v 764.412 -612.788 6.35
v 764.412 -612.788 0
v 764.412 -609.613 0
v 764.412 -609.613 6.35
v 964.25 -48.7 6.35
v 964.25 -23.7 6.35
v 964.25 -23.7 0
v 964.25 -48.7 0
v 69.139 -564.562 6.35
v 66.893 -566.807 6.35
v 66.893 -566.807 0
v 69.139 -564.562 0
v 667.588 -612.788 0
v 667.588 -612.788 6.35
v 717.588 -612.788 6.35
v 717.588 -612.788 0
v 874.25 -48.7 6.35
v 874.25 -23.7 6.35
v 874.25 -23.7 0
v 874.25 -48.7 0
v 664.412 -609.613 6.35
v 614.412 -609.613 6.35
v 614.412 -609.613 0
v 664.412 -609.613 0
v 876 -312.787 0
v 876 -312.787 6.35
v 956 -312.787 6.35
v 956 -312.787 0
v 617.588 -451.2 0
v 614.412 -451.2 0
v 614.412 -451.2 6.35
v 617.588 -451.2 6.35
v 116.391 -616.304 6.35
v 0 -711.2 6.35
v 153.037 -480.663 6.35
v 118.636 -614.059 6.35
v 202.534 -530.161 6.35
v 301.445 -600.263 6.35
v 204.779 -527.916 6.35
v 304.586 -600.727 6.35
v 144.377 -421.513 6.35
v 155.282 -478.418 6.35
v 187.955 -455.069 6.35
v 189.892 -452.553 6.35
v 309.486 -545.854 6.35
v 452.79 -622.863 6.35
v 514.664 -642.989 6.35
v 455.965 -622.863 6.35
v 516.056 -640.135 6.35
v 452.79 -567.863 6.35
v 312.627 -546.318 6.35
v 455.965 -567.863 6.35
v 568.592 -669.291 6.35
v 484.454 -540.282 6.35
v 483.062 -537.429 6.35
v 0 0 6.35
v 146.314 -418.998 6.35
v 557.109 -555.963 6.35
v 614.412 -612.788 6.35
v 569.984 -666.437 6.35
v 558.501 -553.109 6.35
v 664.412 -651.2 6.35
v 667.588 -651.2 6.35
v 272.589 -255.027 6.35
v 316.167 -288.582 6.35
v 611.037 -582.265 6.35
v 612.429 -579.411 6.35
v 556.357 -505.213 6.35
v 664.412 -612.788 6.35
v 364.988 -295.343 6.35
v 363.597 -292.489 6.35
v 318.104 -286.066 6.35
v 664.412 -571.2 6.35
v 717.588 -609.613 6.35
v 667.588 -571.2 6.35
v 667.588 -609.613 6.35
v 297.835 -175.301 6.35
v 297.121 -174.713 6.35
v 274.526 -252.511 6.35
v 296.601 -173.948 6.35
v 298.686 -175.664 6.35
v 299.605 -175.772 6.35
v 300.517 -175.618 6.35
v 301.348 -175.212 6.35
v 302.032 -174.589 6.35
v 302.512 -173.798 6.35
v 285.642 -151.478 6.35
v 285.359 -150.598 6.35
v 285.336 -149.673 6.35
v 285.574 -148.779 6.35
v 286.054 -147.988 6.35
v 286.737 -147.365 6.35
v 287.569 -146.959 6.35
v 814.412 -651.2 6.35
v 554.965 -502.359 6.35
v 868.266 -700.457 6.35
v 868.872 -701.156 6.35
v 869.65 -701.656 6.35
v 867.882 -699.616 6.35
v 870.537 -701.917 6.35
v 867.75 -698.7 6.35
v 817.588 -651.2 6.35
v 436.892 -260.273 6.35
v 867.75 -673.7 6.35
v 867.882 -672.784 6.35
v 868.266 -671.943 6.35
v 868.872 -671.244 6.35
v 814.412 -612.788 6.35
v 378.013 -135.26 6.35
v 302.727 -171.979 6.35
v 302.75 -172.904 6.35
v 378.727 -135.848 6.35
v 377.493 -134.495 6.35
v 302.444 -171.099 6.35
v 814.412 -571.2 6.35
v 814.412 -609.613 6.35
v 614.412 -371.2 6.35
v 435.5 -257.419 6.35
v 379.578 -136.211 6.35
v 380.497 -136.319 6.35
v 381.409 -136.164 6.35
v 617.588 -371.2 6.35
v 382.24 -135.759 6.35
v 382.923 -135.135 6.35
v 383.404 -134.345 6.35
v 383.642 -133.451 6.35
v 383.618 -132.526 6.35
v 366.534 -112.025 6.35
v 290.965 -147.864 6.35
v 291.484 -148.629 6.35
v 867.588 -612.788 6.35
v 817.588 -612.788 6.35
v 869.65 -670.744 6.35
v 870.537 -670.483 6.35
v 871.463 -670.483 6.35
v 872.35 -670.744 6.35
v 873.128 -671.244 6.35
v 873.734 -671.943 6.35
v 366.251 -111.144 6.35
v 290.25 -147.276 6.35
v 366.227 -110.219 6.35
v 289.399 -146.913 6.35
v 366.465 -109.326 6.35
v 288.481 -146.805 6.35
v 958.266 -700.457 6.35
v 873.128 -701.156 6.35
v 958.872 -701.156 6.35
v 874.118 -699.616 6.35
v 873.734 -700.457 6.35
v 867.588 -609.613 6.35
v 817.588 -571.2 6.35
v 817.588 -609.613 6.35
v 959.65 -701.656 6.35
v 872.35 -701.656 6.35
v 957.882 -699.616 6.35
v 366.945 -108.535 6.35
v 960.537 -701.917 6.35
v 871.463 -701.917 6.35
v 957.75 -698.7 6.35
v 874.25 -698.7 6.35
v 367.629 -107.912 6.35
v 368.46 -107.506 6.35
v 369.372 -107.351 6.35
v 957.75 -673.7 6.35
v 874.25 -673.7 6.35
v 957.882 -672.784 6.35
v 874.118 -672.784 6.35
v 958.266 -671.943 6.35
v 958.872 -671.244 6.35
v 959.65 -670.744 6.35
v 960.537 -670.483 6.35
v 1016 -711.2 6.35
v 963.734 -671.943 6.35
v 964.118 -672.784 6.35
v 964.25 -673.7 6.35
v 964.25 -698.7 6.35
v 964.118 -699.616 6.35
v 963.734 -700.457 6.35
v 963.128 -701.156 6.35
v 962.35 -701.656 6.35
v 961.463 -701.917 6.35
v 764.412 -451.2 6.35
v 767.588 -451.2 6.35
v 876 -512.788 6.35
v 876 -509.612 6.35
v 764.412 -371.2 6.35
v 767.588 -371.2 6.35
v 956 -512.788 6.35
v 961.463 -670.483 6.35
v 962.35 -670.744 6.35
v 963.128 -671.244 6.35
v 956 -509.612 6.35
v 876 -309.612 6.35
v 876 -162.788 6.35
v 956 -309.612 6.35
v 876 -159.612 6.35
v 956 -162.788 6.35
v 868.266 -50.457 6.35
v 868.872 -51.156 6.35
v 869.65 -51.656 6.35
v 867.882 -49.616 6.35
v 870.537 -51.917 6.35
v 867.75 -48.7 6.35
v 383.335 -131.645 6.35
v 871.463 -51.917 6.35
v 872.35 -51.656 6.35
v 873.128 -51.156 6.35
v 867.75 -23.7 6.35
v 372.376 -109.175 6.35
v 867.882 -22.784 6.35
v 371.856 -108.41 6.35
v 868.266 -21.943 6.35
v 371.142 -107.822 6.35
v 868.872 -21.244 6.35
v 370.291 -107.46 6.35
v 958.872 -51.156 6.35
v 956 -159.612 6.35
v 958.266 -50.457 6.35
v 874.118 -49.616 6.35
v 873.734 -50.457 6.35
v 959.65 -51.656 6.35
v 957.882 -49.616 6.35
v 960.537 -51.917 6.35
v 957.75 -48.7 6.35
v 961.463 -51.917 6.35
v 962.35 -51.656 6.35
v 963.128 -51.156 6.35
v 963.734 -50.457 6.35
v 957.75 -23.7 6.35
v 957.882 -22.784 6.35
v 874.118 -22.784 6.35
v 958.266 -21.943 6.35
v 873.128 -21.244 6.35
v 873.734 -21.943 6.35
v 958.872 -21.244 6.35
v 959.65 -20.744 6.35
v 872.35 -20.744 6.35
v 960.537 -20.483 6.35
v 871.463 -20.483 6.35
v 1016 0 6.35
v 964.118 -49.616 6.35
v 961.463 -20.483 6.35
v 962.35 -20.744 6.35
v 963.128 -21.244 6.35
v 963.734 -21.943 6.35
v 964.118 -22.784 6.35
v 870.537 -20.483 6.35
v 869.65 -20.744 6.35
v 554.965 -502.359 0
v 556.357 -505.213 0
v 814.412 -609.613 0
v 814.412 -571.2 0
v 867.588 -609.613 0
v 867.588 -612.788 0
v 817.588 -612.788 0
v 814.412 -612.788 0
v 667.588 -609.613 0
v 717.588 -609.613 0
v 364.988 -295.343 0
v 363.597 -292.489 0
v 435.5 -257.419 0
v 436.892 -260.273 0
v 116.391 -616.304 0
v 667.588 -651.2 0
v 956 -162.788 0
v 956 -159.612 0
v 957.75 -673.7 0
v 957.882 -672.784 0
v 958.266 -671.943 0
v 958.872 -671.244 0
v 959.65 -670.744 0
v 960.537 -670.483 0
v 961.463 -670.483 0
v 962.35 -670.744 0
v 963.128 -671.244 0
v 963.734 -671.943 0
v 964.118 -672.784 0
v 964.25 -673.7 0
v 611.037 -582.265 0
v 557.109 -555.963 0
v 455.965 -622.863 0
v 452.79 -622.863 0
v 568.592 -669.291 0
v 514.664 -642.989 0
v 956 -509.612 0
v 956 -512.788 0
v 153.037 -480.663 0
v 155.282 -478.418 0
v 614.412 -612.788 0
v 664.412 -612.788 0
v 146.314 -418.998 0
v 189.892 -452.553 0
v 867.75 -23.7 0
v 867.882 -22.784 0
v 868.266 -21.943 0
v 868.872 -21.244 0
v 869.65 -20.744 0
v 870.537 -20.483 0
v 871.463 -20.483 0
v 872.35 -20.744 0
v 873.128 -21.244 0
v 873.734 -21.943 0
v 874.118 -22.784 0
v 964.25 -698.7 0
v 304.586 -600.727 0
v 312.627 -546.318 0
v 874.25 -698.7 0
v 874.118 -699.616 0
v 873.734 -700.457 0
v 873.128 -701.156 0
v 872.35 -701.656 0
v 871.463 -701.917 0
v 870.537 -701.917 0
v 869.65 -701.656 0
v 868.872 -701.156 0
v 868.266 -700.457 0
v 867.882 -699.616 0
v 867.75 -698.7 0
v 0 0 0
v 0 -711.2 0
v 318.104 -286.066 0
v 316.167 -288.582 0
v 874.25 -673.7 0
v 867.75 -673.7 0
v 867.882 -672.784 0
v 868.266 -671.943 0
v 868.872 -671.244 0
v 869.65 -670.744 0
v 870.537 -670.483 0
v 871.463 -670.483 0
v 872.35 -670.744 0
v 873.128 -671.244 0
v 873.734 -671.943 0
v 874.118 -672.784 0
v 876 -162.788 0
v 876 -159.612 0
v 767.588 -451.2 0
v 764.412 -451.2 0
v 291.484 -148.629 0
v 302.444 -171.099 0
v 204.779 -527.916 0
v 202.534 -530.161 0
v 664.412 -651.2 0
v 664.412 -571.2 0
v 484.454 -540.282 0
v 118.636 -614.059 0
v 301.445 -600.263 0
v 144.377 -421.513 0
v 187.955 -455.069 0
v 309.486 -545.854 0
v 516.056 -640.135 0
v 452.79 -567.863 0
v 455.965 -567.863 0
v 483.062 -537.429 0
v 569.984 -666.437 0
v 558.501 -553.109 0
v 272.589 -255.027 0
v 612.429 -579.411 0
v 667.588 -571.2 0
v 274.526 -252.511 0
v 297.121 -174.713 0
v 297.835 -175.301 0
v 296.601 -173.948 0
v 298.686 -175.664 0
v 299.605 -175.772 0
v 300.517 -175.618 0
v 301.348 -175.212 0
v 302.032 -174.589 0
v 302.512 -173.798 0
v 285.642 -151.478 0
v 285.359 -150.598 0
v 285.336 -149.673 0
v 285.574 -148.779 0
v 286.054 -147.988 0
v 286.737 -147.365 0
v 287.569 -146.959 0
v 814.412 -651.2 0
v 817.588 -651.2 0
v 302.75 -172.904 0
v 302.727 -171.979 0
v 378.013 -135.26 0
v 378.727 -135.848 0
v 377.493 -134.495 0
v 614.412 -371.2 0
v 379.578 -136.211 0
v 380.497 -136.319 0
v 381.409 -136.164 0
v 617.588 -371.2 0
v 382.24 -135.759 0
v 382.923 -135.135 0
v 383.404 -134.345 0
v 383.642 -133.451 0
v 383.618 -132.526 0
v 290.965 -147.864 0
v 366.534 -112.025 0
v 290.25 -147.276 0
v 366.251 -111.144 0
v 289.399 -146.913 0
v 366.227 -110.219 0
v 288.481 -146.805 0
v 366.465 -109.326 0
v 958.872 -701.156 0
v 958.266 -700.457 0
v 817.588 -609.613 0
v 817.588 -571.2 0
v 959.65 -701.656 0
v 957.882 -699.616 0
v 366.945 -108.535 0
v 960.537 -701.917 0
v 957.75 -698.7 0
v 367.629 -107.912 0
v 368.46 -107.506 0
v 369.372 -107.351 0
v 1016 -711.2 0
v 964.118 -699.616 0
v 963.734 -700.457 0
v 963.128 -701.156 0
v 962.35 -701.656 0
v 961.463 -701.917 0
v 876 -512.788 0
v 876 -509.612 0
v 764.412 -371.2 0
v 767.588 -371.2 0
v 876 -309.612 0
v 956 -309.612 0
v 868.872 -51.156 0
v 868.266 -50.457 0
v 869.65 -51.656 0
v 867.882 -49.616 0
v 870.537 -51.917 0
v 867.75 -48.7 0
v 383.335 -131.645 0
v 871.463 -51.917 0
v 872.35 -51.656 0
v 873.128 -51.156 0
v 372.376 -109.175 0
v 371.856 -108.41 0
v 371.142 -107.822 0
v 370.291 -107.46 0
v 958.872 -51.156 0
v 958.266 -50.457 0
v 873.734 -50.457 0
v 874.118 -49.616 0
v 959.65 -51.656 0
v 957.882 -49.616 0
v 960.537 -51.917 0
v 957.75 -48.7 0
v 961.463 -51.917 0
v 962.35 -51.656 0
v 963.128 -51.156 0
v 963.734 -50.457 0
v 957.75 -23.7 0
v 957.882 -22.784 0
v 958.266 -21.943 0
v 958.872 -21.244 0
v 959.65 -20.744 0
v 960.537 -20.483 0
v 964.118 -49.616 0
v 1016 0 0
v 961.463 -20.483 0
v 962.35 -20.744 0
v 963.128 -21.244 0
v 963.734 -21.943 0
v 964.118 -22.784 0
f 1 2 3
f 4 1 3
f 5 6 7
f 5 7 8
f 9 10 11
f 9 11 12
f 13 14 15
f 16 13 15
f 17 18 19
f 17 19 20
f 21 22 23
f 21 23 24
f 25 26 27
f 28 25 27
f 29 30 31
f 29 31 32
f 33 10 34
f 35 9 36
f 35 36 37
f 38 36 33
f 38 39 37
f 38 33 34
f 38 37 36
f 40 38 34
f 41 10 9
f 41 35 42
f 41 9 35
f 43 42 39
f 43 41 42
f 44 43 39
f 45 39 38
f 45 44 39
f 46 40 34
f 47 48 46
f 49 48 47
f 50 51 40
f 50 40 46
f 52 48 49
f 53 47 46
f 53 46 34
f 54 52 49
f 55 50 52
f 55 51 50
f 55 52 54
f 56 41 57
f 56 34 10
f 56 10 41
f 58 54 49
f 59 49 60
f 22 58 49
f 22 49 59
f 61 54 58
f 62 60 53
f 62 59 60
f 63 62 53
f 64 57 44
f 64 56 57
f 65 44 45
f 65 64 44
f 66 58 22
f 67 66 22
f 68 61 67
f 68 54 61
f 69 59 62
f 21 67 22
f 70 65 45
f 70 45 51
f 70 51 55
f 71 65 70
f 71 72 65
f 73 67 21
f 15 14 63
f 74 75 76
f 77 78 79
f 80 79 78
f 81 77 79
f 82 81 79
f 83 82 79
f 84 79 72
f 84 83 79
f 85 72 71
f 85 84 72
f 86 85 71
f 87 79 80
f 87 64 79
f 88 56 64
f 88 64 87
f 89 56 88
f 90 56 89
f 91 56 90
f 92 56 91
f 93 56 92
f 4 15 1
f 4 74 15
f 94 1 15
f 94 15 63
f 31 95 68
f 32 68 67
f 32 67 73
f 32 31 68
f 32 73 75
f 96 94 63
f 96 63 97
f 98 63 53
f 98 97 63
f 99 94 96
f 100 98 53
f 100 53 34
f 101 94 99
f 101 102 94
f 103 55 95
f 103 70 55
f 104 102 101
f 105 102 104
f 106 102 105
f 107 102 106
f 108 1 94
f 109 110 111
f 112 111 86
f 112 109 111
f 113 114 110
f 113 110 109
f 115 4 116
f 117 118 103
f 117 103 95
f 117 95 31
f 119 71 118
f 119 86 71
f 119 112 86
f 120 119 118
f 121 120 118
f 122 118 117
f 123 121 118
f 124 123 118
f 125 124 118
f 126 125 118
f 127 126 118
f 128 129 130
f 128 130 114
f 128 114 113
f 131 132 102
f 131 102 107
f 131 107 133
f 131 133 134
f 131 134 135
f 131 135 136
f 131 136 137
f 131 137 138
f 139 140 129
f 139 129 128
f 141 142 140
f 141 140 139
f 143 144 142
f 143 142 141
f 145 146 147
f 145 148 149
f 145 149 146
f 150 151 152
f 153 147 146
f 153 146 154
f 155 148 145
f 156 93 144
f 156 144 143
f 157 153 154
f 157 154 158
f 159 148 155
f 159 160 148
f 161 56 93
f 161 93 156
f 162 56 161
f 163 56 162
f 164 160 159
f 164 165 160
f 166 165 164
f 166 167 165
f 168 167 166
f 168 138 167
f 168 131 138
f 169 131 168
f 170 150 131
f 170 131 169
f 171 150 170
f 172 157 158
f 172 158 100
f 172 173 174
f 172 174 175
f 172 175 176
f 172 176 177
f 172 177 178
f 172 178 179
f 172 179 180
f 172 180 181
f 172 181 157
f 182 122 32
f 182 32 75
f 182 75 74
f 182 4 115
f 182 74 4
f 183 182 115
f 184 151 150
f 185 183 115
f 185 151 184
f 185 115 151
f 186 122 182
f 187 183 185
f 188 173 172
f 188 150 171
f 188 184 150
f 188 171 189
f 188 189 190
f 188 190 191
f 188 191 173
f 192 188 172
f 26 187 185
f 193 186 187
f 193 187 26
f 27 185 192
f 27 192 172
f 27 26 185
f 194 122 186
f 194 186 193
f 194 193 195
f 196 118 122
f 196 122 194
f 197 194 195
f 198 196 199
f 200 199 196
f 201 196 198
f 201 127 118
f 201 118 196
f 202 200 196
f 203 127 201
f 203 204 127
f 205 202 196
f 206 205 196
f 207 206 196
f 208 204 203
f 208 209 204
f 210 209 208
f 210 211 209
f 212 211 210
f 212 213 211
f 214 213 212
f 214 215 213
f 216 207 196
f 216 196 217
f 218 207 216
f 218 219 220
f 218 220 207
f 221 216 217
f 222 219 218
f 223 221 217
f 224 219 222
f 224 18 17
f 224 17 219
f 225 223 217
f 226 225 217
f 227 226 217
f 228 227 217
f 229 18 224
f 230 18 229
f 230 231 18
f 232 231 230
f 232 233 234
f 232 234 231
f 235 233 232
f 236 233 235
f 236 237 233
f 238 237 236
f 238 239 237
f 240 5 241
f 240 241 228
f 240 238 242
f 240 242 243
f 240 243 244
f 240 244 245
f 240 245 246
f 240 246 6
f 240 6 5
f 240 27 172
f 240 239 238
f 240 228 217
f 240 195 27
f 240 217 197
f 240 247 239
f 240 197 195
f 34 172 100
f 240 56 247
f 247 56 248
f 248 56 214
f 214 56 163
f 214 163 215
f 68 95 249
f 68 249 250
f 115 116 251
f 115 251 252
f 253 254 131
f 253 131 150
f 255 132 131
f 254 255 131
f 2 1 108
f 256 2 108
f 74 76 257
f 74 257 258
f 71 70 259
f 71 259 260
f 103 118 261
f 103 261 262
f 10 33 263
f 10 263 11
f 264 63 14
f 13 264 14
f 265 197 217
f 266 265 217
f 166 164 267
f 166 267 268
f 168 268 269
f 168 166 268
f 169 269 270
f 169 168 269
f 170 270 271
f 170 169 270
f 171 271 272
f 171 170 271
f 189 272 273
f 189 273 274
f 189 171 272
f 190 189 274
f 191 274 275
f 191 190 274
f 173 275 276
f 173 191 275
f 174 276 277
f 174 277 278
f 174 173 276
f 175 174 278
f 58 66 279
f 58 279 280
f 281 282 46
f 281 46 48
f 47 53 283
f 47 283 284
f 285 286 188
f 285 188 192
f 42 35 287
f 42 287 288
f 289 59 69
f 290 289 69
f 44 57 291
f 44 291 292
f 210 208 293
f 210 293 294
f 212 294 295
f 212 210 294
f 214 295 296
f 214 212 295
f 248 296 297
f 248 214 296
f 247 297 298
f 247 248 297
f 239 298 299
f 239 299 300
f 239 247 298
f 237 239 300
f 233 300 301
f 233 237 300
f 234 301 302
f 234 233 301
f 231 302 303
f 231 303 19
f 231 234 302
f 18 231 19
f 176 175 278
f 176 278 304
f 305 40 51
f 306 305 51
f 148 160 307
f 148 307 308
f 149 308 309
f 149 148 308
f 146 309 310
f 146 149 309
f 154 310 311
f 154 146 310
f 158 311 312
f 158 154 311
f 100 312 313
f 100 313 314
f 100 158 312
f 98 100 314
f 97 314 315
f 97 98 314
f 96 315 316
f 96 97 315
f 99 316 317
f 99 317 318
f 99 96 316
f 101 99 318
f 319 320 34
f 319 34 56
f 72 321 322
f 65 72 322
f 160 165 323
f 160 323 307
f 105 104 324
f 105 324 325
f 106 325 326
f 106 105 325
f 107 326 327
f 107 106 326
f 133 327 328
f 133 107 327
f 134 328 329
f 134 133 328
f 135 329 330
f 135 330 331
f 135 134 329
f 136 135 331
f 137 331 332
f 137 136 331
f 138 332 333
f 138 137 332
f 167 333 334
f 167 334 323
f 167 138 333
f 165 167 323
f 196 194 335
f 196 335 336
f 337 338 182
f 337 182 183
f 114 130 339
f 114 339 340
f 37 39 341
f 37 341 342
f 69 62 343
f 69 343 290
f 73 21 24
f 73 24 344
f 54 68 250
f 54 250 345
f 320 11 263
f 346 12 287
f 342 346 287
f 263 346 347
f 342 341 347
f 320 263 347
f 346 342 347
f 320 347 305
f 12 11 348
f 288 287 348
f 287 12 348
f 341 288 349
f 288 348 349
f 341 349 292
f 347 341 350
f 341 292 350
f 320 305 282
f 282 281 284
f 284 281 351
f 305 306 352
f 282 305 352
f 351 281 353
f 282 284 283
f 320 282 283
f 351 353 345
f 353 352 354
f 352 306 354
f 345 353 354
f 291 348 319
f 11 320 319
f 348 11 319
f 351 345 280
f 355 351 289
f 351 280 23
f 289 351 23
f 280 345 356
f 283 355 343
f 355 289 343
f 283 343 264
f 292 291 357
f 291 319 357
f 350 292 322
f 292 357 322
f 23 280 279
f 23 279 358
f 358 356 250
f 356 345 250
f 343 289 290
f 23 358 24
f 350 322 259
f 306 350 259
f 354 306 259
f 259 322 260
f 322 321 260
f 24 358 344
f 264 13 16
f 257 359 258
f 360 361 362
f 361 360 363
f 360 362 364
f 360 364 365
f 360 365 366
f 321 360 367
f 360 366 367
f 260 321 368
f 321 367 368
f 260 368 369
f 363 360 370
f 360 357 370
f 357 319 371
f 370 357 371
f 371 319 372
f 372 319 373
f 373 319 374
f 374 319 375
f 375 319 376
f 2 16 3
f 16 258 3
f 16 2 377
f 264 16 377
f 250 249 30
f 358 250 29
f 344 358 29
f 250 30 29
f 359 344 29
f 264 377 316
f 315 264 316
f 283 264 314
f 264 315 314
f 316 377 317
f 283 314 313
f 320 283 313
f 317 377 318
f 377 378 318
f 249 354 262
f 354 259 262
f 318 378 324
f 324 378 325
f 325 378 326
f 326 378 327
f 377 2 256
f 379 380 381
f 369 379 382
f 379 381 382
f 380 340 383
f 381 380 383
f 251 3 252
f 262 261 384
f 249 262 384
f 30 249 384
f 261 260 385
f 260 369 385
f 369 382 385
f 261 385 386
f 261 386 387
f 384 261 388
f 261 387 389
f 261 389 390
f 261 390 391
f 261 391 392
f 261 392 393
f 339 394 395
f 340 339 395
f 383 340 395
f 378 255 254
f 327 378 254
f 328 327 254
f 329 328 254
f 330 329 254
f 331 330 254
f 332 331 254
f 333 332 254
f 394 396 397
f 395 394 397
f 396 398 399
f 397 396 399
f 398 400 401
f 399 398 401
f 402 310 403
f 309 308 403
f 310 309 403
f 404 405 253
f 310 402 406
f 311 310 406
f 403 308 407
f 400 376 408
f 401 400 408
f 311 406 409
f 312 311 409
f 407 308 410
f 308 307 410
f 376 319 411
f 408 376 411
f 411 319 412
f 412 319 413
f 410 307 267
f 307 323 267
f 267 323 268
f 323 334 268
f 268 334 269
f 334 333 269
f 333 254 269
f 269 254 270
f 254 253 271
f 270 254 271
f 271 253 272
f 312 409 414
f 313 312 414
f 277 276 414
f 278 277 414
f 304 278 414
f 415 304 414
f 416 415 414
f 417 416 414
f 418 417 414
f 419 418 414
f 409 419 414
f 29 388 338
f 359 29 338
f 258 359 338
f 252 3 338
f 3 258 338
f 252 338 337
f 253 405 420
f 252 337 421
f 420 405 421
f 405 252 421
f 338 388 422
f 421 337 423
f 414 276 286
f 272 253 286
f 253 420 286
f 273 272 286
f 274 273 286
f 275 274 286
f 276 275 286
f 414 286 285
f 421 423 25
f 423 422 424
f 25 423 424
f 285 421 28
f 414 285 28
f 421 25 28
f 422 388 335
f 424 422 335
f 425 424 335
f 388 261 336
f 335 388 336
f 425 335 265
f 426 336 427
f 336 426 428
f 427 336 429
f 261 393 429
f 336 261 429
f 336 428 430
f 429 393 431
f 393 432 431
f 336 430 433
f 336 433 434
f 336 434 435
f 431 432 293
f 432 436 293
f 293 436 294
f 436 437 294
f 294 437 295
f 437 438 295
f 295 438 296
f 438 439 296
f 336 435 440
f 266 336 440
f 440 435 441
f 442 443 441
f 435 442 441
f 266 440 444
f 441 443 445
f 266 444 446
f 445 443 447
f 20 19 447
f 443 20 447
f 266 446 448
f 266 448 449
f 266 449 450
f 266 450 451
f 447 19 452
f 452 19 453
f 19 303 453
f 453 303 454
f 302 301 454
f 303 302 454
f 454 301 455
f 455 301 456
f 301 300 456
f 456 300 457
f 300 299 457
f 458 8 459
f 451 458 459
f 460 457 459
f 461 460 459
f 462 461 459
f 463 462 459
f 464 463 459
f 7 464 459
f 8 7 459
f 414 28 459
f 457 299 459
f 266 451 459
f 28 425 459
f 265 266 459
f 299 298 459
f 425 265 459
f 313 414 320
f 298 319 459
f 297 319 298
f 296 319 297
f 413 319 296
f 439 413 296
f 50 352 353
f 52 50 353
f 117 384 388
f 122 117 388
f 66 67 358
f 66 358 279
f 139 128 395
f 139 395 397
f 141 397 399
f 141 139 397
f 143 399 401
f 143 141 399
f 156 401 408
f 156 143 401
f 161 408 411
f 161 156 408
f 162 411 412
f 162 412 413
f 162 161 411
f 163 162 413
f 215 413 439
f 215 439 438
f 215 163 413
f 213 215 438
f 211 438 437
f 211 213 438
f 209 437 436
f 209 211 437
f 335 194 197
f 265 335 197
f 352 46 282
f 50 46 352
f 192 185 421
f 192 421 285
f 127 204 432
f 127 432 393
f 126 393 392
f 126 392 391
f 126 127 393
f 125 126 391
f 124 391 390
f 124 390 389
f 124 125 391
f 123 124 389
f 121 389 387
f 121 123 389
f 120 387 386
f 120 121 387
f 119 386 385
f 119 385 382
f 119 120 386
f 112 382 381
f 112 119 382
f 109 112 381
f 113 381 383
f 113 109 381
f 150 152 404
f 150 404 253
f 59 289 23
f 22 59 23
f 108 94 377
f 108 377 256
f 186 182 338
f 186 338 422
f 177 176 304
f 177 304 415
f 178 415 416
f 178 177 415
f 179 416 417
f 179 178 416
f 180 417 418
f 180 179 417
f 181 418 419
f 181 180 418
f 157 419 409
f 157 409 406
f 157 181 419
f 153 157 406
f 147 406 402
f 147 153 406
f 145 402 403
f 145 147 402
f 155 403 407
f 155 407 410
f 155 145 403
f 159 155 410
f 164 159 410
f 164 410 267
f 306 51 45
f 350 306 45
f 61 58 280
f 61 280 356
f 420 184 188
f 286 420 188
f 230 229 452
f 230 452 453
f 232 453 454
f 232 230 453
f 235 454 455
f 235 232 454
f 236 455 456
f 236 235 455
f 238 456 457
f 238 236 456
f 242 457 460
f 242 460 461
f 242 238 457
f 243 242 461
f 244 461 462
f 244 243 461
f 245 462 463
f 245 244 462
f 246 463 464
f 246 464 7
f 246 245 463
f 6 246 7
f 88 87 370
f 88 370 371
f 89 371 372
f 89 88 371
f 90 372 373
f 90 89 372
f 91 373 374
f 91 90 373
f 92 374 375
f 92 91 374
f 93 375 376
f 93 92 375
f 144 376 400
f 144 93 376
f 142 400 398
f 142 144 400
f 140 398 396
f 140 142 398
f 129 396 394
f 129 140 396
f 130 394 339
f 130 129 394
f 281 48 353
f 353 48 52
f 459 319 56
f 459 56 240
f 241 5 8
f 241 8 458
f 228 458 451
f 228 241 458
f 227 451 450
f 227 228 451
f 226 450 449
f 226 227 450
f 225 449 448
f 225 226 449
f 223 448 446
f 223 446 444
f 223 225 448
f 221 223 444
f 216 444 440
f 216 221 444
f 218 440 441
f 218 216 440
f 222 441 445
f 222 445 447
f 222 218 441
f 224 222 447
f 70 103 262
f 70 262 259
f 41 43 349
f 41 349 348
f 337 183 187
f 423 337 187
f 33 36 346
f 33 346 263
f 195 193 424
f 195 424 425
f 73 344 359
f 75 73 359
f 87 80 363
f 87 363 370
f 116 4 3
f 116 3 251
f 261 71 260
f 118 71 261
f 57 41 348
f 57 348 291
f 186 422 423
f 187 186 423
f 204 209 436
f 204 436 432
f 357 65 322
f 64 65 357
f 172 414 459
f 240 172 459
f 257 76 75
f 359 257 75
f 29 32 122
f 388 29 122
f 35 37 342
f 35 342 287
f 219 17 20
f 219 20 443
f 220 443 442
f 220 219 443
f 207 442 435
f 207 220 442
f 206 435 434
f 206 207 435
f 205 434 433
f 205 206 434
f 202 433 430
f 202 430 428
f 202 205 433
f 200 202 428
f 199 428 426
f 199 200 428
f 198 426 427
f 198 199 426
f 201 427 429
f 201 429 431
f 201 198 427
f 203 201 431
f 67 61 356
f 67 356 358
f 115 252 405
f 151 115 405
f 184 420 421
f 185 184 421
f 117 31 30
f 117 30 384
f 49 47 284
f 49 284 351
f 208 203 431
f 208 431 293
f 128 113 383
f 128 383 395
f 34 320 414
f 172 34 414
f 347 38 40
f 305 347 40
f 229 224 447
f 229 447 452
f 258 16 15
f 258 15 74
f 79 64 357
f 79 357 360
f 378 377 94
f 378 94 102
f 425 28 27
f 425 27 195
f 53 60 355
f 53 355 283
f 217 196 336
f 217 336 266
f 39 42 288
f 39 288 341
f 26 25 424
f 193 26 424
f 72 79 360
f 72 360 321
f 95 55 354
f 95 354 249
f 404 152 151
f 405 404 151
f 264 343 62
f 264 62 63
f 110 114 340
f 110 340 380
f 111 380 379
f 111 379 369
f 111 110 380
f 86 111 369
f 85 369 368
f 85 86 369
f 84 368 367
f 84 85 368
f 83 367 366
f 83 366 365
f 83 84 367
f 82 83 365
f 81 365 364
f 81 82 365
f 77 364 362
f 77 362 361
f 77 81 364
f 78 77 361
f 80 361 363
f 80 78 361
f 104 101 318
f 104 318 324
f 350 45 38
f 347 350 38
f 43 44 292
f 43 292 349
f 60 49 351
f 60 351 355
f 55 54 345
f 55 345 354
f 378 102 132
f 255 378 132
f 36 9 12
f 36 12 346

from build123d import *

# Parameters (mm, degrees)
SKETCH1_W           = 1016
SKETCH1_H           = 711.2
BOSS_EXTRUDE1_DEPTH = 6.35
SKETCH2_W           = 80
SKETCH2_H           = 3.175
SKETCH2_W_2         = 3.175
SKETCH2_H_2         = 80
CUT_EXTRUDE1_DEPTH  = 6.35
SKETCH3_W           = 50
SKETCH3_H           = 3.175
CUT_EXTRUDE2_DEPTH  = 10
CUT_EXTRUDE3_DEPTH  = 7.35
CUT_EXTRUDE4_DEPTH  = 7.35
CUT_EXTRUDE5_DEPTH  = 7.35
SKETCH8_W           = 3.175
SKETCH8_H           = 55
CUT_EXTRUDE6_DEPTH  = 7.35


with BuildPart() as part:
    # Sketch1 → Boss-Extrude1 (new body)
    with BuildSketch(Plane.XY):
        with Locations((508, -355.6)):
            Rectangle(SKETCH1_W, SKETCH1_H)
    extrude(amount=BOSS_EXTRUDE1_DEPTH)

    # Sketch2 → Cut-Extrude1 (cut)
    with BuildSketch(Plane.XY.offset(6.35)):
        with Locations((916, -161.2)):
            Rectangle(SKETCH2_W, SKETCH2_H)
        with Locations((916, -311.2)):
            Rectangle(SKETCH2_W, SKETCH2_H)
        with Locations((916, -511.2)):
            Rectangle(SKETCH2_W, SKETCH2_H)
        with Locations((766, -411.2)):
            Rectangle(SKETCH2_W_2, SKETCH2_H_2)
        with Locations((616, -411.2)):
            Rectangle(SKETCH2_W_2, SKETCH2_H_2)
        with BuildLine():
            Line((874.25, -673.7), (874.25, -698.7))
            ThreePointArc((874.25, -698.7), (871, -701.95), (867.75, -698.7))
            Line((867.75, -698.7), (867.75, -673.7))
            ThreePointArc((867.75, -673.7), (871, -670.45), (874.25, -673.7))
        make_face()
        Polygon((363.596651934, -292.488903378), (435.500175638, -257.419211635), (436.892004029, -260.272882732), (364.988480325, -295.342574475), align=None)
        Polygon((483.061726987, -537.428605693), (554.965250691, -502.35891395), (556.357079082, -505.212585047), (484.453555378, -540.28227679), align=None)
        with Locations((816, -611.2)):
            Rectangle(SKETCH2_W_2, SKETCH2_H_2)
        with Locations((666, -611.2)):
            Rectangle(SKETCH2_W_2, SKETCH2_H_2)
        Polygon((558.501253664, -553.109163281), (612.428896442, -579.411432089), (611.037068051, -582.265103186), (557.109425273, -555.962834378), align=None)
        Polygon((516.055967376, -640.134896814), (569.983610154, -666.437165622), (568.591781763, -669.290836719), (514.664138985, -642.988567911), align=None)
        Polygon((69.138539017, -564.561537688), (118.6360137, -614.059012371), (116.39094967, -616.304076401), (66.893474987, -566.806601718), align=None)
        Polygon((155.281822635, -478.418254069), (204.779297318, -527.915728753), (202.534233288, -530.160792783), (153.036758605, -480.6633181), align=None)
        with BuildLine():
            Line((964.25, -673.7), (964.25, -698.7))
            ThreePointArc((964.25, -698.7), (961, -701.95), (957.75, -698.7))
            Line((957.75, -698.7), (957.75, -673.7))
            ThreePointArc((957.75, -673.7), (961, -670.45), (964.25, -673.7))
        make_face()
        with BuildLine():
            Line((291.484365195, -148.62885591), (302.443643865, -171.098707067))
            ThreePointArc((302.443643865, -171.098707067), (300.947269442, -175.444493945), (296.601482564, -173.948119522))
            Line((296.601482564, -173.948119522), (285.642203894, -151.478268364))
            ThreePointArc((285.642203894, -151.478268364), (287.138578318, -147.132481487), (291.484365195, -148.62885591))
        make_face()
        with BuildLine():
            Line((372.375829362, -109.175452699), (383.335108032, -131.645303856))
            ThreePointArc((383.335108032, -131.645303856), (381.838733609, -135.991090734), (377.492946731, -134.494716311))
            Line((377.492946731, -134.494716311), (366.533668061, -112.024865153))
            ThreePointArc((366.533668061, -112.024865153), (368.030042485, -107.679078276), (372.375829362, -109.175452699))
        make_face()
        with BuildLine():
            Line((874.25, -23.7), (874.25, -48.7))
            ThreePointArc((874.25, -48.7), (871, -51.95), (867.75, -48.7))
            Line((867.75, -48.7), (867.75, -23.7))
            ThreePointArc((867.75, -23.7), (871, -20.45), (874.25, -23.7))
        make_face()
        with BuildLine():
            Line((957.75, -48.7), (957.75, -23.7))
            ThreePointArc((957.75, -23.7), (961, -20.45), (964.25, -23.7))
            Line((964.25, -23.7), (964.25, -48.7))
            ThreePointArc((964.25, -48.7), (961, -51.95), (957.75, -48.7))
        make_face()
    extrude(amount=-CUT_EXTRUDE1_DEPTH, mode=Mode.SUBTRACT)

    # Sketch3 → Cut-Extrude2 (cut)
    with BuildSketch(Plane.XY.offset(6.35)):
        with Locations((639.4125, -611.2)):
            Rectangle(SKETCH3_W, SKETCH3_H)
        with Locations((692.5875, -611.2)):
            Rectangle(SKETCH3_W, SKETCH3_H)
        with Locations((789.4125, -611.2)):
            Rectangle(SKETCH3_W, SKETCH3_H)
        with Locations((842.5875, -611.2)):
            Rectangle(SKETCH3_W, SKETCH3_H)
    extrude(amount=-CUT_EXTRUDE2_DEPTH, mode=Mode.SUBTRACT)

    # Sketch5 → Cut-Extrude3 (cut, through all)
    with BuildSketch(Plane.XY.offset(6.35)):
        Polygon((274.525666155, -252.511008661), (318.103646625, -286.066330417), (316.166589414, -288.58196838), (272.588608944, -255.026646624), align=None)
    extrude(amount=-CUT_EXTRUDE3_DEPTH, mode=Mode.SUBTRACT)

    # Sketch6 → Cut-Extrude4 (cut, through all)
    with BuildSketch(Plane.XY.offset(6.35)):
        Polygon((146.314409554, -418.997731493), (189.892390024, -452.553053249), (187.955332813, -455.068691213), (144.377352343, -421.513369457), align=None)
    extrude(amount=-CUT_EXTRUDE4_DEPTH, mode=Mode.SUBTRACT)

    # Sketch7 → Cut-Extrude5 (cut, through all)
    with BuildSketch(Plane.XY.offset(6.35)):
        Polygon((309.486197622, -545.854084542), (301.444635941, -600.263029448), (304.585515942, -600.727246872), (312.627077623, -546.318301967), align=None)
    extrude(amount=-CUT_EXTRUDE5_DEPTH, mode=Mode.SUBTRACT)

    # Sketch8 → Cut-Extrude6 (cut, through all)
    with BuildSketch(Plane.XY.offset(6.35)):
        with Locations((454.377367326, -595.36266963)):
            Rectangle(SKETCH8_W, SKETCH8_H)
    extrude(amount=-CUT_EXTRUDE6_DEPTH, mode=Mode.SUBTRACT)


solid = part.part
